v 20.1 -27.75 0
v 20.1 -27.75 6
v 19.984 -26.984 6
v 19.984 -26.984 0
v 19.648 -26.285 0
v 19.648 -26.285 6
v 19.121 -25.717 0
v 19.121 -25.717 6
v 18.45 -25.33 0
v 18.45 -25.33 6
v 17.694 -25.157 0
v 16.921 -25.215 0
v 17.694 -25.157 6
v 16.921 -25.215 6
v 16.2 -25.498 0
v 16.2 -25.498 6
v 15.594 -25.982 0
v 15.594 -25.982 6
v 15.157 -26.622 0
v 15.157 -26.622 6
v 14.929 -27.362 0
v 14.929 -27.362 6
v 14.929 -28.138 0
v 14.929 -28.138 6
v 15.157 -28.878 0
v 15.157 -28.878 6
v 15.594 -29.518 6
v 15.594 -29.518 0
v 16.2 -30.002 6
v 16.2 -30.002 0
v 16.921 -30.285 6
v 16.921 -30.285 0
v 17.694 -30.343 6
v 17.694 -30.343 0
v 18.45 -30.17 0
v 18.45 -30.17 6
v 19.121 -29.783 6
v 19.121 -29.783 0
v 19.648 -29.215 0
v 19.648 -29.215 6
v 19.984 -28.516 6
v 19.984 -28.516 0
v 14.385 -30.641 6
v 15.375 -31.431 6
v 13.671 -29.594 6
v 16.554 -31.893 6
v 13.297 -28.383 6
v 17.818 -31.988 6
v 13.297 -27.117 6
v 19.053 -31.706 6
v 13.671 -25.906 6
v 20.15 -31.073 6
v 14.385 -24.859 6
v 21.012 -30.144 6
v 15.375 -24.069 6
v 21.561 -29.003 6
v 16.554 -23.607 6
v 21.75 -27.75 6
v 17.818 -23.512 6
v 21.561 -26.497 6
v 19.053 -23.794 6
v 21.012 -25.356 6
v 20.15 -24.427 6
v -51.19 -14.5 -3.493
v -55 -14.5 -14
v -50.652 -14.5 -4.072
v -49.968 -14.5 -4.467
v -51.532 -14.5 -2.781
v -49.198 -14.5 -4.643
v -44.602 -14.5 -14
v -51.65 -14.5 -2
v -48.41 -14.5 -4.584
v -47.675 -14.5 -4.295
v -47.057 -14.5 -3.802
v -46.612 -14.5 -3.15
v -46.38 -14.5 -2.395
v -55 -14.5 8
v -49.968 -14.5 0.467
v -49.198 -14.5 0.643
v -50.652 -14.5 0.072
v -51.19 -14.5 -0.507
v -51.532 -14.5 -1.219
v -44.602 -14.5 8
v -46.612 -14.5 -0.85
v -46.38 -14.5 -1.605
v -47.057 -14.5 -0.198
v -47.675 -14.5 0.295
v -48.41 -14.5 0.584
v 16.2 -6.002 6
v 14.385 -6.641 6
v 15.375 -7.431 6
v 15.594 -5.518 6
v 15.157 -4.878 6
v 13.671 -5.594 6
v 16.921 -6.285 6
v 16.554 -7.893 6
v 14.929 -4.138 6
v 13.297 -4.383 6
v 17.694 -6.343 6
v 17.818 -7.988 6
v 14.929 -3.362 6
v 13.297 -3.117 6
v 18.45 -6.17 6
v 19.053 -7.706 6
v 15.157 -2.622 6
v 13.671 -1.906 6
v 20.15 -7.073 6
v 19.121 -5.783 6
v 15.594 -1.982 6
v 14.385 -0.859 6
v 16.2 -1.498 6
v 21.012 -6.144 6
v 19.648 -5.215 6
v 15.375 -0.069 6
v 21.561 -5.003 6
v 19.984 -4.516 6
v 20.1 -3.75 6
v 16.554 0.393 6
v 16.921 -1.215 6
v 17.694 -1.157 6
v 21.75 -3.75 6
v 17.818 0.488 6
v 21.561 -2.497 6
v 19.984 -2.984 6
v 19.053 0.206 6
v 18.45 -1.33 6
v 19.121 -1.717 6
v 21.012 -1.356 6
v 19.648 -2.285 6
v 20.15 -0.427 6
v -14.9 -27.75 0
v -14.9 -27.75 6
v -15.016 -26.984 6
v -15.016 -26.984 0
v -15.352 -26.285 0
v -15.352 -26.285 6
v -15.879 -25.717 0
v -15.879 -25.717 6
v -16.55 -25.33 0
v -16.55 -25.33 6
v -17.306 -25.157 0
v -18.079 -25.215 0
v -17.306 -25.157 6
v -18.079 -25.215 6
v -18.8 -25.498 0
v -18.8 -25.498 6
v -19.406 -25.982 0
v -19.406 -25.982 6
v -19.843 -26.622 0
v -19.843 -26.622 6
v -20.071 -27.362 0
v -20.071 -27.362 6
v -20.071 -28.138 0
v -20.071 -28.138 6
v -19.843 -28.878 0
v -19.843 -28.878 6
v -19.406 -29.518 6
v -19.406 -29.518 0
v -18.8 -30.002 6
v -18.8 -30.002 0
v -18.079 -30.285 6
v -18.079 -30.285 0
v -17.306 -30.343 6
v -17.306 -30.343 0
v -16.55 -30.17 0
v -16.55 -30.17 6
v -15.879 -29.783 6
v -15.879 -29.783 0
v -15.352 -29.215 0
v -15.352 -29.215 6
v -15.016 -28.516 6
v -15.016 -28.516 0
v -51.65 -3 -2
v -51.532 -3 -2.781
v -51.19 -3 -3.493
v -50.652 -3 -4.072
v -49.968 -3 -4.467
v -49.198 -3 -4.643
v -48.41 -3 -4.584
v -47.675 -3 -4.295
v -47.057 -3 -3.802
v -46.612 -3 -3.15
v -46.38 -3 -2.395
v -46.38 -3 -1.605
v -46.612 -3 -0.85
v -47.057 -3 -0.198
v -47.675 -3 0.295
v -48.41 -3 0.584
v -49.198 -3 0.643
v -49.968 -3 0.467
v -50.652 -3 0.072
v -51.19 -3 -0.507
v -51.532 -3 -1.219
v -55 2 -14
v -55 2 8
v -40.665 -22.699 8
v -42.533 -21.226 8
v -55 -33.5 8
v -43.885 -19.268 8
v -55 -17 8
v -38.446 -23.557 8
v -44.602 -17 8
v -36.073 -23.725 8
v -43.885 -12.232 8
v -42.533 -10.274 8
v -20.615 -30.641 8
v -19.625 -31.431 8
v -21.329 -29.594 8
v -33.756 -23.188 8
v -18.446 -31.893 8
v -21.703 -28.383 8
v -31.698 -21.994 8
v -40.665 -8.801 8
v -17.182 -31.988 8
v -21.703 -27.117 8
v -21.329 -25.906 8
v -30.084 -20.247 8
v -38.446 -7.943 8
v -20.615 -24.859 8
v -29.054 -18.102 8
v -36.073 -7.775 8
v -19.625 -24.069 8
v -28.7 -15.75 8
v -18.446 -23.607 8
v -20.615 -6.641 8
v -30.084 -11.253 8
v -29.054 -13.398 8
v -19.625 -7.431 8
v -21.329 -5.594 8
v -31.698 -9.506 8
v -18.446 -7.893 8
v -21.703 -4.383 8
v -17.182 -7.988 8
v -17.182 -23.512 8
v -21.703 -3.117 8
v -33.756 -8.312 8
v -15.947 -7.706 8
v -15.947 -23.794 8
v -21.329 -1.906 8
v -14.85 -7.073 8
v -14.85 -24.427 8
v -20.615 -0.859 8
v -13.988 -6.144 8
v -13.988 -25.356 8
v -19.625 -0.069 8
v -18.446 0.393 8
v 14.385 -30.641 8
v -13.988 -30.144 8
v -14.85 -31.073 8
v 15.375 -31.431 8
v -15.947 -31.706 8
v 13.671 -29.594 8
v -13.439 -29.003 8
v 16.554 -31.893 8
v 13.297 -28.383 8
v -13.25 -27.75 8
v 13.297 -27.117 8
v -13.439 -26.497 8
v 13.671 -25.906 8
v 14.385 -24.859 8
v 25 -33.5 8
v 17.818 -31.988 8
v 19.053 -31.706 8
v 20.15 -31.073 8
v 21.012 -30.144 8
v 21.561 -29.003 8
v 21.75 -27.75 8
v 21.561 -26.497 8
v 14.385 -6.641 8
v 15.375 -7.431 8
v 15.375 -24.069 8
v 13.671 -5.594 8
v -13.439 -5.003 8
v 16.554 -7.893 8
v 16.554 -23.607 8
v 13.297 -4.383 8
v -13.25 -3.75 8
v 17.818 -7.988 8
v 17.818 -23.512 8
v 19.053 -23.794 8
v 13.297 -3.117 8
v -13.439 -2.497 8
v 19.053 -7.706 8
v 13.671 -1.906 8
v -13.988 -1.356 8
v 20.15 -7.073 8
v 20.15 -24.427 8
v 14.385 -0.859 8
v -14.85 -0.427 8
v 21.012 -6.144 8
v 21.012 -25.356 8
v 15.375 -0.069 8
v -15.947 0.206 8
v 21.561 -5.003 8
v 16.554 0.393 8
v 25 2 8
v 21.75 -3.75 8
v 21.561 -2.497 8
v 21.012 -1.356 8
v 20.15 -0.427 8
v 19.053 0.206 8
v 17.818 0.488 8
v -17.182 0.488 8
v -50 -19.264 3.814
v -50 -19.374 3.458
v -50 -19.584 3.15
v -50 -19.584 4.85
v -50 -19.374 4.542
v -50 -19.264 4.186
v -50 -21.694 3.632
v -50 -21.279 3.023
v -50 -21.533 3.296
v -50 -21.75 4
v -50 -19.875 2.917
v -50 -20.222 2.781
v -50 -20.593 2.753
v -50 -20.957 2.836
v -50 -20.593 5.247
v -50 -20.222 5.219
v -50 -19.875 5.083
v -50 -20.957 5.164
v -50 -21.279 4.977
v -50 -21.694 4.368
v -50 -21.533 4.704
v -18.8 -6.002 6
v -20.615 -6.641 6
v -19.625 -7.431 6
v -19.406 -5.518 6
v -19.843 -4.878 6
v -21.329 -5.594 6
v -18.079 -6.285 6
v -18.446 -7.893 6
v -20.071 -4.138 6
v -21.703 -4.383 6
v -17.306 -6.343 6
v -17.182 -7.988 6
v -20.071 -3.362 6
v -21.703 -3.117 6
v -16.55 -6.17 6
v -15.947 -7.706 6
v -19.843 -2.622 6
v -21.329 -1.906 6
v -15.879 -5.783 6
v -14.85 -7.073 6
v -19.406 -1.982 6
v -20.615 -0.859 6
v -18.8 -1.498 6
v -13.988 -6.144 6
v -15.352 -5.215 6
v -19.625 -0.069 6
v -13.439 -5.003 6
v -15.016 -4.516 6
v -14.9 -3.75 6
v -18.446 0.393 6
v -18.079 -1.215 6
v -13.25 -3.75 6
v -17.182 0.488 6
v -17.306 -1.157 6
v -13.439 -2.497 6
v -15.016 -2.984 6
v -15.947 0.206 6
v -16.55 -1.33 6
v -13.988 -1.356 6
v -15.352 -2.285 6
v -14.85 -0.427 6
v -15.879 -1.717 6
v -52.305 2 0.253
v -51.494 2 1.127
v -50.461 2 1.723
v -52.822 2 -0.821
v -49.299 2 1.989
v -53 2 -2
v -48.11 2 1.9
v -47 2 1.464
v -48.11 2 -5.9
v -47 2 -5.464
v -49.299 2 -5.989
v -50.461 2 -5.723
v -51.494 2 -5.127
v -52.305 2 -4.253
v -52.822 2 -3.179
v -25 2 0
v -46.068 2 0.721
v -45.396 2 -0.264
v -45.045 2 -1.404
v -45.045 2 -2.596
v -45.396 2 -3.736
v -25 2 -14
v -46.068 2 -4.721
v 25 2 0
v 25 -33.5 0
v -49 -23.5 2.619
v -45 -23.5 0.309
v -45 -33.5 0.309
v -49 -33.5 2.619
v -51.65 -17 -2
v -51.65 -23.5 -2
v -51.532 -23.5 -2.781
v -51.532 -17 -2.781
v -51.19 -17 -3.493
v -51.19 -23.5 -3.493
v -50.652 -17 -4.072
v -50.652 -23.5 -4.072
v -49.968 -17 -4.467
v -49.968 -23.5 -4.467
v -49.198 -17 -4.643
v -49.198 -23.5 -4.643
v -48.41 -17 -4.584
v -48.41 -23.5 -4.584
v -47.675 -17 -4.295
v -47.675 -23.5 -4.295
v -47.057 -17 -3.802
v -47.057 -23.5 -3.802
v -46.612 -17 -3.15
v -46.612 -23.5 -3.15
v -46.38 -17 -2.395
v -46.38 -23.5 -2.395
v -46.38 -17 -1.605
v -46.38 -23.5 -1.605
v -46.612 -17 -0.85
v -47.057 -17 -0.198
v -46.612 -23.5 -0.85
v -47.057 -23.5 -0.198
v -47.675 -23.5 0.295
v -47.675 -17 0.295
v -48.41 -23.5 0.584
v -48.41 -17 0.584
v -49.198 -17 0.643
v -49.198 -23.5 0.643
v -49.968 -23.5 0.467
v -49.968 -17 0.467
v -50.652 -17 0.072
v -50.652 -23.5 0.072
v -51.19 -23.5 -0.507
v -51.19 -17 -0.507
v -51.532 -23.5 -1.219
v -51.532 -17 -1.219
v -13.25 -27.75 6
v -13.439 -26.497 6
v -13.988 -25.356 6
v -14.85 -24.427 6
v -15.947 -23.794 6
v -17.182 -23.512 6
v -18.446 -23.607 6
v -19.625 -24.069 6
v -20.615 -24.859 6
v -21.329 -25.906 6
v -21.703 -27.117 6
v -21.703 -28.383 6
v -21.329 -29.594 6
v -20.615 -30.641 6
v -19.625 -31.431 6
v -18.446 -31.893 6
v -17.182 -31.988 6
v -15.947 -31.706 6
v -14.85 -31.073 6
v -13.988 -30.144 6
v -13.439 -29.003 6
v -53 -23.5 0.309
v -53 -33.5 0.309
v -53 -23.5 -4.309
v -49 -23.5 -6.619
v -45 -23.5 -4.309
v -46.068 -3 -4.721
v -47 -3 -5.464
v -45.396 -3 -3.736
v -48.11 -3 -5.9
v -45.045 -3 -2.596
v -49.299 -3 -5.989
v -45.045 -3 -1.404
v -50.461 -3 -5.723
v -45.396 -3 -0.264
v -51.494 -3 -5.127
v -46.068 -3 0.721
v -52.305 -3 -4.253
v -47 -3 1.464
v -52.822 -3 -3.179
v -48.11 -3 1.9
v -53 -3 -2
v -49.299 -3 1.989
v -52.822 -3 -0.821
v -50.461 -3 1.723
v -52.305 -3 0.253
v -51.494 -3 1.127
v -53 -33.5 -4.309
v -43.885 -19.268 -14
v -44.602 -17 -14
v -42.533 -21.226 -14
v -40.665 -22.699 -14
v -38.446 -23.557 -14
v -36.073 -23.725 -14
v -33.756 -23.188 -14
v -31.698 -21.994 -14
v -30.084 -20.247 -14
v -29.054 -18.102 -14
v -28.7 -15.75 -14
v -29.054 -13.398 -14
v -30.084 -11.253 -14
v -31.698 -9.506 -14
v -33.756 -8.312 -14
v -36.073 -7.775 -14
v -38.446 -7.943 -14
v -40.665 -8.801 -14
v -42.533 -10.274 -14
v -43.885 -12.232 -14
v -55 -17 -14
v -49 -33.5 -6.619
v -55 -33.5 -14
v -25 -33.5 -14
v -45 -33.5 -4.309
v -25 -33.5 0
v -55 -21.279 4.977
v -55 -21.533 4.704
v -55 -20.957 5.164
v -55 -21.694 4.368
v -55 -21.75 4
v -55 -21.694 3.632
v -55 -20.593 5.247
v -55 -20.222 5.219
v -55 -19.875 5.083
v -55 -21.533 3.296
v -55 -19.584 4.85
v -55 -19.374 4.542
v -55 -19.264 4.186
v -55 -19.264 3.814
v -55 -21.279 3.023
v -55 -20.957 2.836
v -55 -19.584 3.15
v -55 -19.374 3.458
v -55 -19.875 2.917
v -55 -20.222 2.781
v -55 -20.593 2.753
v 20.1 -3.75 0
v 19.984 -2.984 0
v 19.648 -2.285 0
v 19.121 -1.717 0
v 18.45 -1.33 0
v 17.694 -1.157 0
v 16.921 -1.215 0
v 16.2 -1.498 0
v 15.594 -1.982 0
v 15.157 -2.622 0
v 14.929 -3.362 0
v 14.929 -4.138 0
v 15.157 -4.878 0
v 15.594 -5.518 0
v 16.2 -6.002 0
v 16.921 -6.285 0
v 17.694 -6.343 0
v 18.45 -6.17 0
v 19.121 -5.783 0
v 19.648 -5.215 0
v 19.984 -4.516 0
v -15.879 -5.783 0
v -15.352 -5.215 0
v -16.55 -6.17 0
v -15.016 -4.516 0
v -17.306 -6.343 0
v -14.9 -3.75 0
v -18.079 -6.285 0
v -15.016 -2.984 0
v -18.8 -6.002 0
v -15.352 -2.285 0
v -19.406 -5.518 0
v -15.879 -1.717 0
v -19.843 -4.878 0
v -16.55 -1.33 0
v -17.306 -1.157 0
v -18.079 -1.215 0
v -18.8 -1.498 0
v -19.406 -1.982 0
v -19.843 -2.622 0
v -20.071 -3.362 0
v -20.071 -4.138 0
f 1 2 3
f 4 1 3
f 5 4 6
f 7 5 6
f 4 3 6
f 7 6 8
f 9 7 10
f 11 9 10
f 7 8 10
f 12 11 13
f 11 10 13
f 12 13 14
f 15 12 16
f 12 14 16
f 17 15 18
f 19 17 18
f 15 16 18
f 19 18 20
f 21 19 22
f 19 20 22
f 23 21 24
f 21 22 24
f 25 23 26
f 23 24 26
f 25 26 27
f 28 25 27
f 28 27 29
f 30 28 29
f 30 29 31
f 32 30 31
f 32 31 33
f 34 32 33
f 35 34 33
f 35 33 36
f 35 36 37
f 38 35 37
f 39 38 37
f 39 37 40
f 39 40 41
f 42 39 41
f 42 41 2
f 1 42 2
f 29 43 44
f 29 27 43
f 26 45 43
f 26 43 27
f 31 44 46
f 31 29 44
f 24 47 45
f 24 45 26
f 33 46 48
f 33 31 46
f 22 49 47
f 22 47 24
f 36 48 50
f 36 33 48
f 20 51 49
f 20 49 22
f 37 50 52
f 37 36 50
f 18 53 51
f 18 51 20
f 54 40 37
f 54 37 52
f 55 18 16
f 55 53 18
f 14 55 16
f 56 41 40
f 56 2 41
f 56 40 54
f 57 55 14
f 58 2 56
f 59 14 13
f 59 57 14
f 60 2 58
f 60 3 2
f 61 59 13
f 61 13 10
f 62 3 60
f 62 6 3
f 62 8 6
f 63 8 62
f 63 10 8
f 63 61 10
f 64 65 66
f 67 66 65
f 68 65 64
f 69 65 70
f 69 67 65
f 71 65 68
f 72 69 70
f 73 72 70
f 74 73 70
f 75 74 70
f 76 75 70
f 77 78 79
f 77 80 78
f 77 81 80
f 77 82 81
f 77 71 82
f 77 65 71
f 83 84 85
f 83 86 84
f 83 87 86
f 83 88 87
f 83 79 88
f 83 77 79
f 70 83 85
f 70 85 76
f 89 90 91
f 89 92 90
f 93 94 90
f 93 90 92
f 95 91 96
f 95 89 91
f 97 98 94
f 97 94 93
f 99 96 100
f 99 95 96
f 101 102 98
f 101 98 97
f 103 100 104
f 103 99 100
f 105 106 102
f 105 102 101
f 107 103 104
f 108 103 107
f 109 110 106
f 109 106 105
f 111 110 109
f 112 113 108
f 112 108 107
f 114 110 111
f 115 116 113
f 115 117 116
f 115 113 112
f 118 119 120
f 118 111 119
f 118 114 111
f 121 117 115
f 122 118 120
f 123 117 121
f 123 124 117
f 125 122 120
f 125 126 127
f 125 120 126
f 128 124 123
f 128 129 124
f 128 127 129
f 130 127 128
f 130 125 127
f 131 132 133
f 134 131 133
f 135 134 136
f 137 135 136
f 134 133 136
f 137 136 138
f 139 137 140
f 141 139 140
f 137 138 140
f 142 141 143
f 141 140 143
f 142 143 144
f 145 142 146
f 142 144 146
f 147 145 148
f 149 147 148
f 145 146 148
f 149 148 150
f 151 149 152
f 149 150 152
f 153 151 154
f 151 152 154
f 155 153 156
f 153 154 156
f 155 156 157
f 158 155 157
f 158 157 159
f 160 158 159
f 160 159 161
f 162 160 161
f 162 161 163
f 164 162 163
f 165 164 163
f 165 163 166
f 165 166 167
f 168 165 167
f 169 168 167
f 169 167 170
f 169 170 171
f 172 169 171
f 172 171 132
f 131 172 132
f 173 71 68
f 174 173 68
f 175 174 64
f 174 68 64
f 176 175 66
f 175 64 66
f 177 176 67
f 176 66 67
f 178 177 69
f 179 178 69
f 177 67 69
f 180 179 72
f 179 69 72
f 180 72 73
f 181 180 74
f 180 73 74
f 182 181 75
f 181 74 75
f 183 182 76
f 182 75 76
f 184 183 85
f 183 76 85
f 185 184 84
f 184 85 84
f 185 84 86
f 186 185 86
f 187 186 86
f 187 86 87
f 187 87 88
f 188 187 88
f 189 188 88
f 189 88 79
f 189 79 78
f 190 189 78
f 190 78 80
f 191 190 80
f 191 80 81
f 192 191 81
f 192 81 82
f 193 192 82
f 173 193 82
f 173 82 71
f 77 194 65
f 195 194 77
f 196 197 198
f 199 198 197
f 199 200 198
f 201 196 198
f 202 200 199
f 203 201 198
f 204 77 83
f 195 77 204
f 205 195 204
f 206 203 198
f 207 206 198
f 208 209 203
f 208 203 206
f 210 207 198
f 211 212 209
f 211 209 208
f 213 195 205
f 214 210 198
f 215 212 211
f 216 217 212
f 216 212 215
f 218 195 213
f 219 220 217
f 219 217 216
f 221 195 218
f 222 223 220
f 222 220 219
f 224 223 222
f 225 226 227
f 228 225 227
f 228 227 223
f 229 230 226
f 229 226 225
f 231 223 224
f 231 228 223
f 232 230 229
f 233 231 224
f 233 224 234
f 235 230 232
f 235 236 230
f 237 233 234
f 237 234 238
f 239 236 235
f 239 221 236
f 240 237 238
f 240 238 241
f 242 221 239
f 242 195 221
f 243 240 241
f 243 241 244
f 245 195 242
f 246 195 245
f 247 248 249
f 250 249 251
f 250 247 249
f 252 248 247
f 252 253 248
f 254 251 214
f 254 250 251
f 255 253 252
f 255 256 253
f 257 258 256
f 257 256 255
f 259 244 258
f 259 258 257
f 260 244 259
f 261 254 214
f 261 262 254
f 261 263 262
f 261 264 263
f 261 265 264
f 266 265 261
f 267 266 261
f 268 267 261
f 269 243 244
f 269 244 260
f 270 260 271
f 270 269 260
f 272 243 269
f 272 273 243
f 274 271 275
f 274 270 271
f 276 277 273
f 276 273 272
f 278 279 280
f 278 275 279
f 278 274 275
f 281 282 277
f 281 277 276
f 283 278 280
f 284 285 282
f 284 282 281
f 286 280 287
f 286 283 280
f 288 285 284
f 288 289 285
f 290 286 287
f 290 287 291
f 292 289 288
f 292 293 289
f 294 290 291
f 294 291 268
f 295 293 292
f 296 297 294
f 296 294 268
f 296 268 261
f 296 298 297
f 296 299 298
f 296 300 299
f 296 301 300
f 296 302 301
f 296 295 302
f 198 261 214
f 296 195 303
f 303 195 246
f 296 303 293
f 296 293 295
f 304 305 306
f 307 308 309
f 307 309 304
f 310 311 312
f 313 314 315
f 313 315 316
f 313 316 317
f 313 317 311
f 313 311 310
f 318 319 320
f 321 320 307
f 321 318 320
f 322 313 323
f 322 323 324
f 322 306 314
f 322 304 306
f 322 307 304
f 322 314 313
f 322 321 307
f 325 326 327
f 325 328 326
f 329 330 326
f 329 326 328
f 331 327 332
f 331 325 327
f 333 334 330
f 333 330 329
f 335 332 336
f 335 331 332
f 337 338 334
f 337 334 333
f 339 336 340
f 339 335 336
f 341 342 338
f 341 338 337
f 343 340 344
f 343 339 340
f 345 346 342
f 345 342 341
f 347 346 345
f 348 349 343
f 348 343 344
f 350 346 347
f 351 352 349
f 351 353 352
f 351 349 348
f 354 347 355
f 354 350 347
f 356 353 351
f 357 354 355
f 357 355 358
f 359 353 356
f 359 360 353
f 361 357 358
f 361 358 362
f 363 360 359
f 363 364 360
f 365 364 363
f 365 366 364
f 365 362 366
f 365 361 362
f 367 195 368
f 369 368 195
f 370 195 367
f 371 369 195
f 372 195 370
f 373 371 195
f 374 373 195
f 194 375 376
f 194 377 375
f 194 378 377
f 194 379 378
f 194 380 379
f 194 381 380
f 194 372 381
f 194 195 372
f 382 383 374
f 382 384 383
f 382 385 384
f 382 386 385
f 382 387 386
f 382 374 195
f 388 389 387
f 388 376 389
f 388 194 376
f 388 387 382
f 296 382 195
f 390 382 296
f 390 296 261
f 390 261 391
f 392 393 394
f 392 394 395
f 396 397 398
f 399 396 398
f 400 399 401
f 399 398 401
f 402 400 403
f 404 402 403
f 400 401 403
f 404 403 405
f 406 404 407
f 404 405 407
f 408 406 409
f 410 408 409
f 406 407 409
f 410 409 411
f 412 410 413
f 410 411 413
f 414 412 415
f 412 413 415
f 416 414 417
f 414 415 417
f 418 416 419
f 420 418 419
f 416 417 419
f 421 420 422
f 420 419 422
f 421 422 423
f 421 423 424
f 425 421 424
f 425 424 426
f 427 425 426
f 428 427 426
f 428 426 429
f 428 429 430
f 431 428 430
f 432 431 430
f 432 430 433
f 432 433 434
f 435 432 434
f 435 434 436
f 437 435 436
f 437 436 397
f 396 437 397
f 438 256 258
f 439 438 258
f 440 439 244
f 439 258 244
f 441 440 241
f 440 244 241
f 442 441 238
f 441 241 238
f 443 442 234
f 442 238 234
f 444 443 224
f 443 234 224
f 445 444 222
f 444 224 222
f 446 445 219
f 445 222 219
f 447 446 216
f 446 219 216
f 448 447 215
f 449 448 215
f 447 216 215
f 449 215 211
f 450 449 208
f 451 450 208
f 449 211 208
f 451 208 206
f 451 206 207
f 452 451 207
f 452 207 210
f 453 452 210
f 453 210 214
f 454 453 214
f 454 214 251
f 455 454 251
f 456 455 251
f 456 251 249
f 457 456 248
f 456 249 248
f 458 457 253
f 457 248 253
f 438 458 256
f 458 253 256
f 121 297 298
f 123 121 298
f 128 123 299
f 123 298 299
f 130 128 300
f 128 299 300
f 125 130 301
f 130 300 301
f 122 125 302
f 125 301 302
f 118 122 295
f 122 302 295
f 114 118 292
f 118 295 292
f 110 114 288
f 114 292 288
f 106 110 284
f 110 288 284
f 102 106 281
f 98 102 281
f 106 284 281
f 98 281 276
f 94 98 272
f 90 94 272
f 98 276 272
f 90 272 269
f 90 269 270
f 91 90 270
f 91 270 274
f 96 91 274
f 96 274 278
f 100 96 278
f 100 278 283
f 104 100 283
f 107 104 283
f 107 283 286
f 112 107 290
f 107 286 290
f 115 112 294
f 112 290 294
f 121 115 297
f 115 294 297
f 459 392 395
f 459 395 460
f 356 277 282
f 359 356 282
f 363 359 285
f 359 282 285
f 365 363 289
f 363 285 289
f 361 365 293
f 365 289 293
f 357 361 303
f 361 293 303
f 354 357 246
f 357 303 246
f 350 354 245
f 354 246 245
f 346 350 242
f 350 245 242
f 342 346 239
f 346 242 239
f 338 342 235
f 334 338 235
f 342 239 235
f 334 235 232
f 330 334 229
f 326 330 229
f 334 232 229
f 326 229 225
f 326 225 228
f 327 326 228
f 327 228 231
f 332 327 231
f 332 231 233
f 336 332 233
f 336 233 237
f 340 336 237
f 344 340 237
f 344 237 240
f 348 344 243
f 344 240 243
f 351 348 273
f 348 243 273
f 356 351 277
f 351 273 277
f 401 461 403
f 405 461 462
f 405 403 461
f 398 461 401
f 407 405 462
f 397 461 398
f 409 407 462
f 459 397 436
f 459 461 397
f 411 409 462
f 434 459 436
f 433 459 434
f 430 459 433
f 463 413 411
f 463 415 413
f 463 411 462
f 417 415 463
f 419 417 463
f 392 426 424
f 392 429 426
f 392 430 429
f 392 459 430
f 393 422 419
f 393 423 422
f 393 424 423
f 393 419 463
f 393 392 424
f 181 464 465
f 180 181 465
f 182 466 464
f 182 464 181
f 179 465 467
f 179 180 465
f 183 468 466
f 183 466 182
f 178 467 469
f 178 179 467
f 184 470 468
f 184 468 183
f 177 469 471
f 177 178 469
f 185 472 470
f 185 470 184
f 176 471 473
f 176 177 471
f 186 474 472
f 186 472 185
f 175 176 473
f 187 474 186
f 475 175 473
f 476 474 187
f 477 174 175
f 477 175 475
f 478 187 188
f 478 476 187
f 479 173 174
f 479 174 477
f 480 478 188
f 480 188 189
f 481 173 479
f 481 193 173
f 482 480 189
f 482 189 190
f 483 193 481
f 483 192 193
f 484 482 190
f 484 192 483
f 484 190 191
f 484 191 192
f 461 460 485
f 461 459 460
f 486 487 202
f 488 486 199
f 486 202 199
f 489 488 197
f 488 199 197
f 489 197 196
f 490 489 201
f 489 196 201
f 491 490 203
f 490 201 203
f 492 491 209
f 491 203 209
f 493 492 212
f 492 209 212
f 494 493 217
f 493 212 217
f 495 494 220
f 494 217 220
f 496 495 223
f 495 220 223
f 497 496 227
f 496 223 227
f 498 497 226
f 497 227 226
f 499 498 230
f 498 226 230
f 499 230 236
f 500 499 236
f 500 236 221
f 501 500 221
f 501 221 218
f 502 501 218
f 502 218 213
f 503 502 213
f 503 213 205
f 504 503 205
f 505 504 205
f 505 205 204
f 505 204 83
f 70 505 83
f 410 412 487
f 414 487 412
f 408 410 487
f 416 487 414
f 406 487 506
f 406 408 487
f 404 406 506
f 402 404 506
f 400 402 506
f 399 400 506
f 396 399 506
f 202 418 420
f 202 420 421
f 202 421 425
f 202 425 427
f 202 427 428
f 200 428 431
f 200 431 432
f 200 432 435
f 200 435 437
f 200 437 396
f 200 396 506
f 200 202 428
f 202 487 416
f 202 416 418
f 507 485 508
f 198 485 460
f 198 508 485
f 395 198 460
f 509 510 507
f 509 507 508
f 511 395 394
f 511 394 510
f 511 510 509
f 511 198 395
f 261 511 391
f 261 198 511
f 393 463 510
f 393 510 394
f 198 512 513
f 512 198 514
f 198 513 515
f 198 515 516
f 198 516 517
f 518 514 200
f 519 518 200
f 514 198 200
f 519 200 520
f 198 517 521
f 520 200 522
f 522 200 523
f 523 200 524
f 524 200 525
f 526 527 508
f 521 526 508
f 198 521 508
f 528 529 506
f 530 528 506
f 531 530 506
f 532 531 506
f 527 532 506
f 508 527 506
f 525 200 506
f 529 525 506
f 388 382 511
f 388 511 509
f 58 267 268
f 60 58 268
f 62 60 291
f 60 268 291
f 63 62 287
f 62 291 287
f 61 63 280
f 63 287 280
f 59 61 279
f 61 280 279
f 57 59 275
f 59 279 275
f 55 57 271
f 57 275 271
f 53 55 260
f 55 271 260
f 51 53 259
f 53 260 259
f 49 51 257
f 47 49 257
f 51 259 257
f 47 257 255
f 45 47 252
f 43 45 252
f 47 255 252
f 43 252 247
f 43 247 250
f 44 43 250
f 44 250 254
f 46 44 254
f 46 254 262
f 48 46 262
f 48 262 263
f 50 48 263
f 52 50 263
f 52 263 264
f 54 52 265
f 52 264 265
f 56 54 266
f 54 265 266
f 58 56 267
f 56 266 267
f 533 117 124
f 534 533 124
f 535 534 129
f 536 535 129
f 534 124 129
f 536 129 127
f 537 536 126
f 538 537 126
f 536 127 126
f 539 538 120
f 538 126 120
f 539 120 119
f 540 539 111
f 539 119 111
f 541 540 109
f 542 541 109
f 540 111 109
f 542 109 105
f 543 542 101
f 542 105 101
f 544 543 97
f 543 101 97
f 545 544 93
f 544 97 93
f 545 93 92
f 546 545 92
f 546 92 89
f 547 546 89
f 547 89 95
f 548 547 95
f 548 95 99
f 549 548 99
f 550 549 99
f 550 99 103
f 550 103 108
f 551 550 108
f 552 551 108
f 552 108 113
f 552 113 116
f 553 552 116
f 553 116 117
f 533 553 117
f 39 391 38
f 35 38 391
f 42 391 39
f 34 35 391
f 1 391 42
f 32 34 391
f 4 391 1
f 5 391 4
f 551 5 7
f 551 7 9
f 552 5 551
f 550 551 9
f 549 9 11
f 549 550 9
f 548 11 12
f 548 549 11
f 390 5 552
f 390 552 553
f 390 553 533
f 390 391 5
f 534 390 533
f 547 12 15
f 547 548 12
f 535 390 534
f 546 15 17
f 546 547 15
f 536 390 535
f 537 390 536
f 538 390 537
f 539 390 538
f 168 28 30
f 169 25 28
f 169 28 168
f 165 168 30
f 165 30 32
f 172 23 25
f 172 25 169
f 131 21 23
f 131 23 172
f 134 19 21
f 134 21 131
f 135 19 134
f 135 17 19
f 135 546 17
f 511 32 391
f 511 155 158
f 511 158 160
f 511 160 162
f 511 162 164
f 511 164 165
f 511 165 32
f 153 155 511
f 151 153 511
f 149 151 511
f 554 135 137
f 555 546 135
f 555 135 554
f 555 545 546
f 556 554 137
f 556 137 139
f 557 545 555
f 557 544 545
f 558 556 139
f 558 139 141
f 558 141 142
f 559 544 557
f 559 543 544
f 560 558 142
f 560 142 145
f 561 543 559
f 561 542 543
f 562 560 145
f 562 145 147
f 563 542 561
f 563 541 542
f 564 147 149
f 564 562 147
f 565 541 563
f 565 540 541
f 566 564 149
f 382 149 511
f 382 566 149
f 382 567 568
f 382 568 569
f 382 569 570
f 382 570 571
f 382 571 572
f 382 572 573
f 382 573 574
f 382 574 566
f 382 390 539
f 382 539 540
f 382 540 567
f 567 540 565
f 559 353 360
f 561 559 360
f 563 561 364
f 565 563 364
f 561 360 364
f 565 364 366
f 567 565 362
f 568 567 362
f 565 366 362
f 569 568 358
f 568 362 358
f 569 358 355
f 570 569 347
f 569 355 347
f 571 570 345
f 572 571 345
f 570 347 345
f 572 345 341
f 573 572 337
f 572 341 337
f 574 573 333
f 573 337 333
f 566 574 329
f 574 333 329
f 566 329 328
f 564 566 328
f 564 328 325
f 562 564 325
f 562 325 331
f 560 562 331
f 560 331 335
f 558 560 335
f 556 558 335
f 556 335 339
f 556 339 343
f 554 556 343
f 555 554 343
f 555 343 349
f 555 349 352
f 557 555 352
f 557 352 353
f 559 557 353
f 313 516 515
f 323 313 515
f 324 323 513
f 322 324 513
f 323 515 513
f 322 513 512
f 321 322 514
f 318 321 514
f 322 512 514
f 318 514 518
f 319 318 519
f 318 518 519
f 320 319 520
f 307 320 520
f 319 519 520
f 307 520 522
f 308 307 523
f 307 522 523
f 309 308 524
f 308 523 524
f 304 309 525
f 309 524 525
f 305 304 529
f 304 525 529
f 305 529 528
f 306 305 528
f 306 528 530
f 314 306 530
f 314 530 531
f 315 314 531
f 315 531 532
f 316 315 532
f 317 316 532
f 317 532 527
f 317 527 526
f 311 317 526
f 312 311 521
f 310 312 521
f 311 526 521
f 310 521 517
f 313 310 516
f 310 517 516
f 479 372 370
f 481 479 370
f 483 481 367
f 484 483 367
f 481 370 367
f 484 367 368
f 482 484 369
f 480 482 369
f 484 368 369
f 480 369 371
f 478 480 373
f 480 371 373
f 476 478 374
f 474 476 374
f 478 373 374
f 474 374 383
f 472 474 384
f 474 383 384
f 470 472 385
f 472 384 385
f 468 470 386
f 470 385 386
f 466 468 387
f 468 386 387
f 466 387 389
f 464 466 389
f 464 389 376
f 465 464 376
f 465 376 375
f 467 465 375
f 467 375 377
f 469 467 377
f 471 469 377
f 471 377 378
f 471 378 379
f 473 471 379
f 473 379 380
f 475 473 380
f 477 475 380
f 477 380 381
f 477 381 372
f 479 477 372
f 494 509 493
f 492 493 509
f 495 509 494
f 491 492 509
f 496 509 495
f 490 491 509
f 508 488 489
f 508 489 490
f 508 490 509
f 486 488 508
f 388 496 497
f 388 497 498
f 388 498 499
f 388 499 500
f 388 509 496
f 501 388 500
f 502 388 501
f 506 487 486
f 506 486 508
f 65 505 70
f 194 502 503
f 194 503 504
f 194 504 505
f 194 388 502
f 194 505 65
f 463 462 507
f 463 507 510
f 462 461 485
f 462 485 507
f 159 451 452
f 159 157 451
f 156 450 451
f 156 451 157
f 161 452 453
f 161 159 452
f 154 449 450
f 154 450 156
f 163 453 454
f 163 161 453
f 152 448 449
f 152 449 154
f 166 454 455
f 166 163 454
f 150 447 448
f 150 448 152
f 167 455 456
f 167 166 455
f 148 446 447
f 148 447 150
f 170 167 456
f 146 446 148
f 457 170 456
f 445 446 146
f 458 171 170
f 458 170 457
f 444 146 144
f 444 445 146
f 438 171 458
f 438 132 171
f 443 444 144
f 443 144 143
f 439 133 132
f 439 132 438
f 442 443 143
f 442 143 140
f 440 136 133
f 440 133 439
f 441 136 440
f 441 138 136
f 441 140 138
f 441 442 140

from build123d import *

# Parameters (mm, degrees)
ESQUISSE1_W              = 50
ESQUISSE1_H              = 31.5
ESQUISSE1_R              = 2.1
BOSS_EXTRU_1_DEPTH       = 8
ESQUISSE3_W              = 44
ESQUISSE3_H              = 31.5
BOSS_EXTRU_2_DEPTH       = 30
ESQUISSE4_R              = 8
ENL_V_MAT_EXTRU_1_DEPTH  = 60
ENL_V_MAT_EXTRU_2_DEPTH  = 56
ESQUISSE7_R              = 3.6
ENL_V_MAT_EXTRU_3_DEPTH  = 2
D_GAGEMENT_M51_D         = 5.3
D_GAGEMENT_M51_DEPTH     = 34
D_GAGEMENT_M51_TIP       = 1.59228064
ENL_V_MAT_EXTRU_4_DEPTH  = 8
ESQUISSE13_W             = 30
ESQUISSE13_H             = 22
ENL_V_MAT_EXTRU_6_DEPTH  = 58
ESQUISSE14_R             = 4
ENL_V_MAT_EXTRU_7_DEPTH  = 3
ESQUISSE15_R             = 1.25
ENL_V_MAT_EXTRU_8_DEPTH  = 5
BOSS_EXTRU_3_DEPTH       = 2
BOSS_EXTRU_4_START       = 2
ESQUISSE17_R             = 4
BOSS_EXTRU_4_DEPTH       = 2
ESQUISSE18_R             = 2.6
ENL_V_MAT_EXTRU_9_DEPTH  = 22
ESQUISSE19_R             = 4.25
ENL_V_MAT_EXTRU_10_DEPTH = 2


with BuildPart() as part:
    # Esquisse1 → Boss.-Extru.1 (new body)
    with BuildSketch(Plane.XY):
        with Locations((0, -15.75)):
            Rectangle(ESQUISSE1_W, ESQUISSE1_H)
        with Locations((17.5, -27.75)):
            Circle(ESQUISSE1_R, mode=Mode.SUBTRACT)
        with Locations((17.5, -3.75)):
            Circle(ESQUISSE1_R, mode=Mode.SUBTRACT)
        with Locations((-17.5, -3.75)):
            Circle(ESQUISSE1_R, mode=Mode.SUBTRACT)
        with Locations((-17.5, -27.75)):
            Circle(ESQUISSE1_R, mode=Mode.SUBTRACT)
    extrude(amount=BOSS_EXTRU_1_DEPTH)

    # Esquisse3 → Boss.-Extru.2 (add)
    with BuildSketch(Plane.ZY.offset(25)):
        with Locations((-14, -15.75)):
            Rectangle(ESQUISSE3_W, ESQUISSE3_H)
    extrude(amount=BOSS_EXTRU_2_DEPTH)

    # Esquisse4 → Enlèv. mat.-Extru.1 (cut)
    with BuildSketch(Plane.XY.offset(8)):
        with Locations((-36.7, -15.75)):
            Circle(ESQUISSE4_R)
    extrude(amount=-ENL_V_MAT_EXTRU_1_DEPTH, mode=Mode.SUBTRACT)

    # Esquisse6 → Enlèv. mat.-Extru.2 (cut)
    with BuildSketch(Plane.XY.offset(8)):
        with BuildLine():
            Line((-55, -14.5), (-44.601740315, -14.5))
            ThreePointArc((-44.601740315, -14.5), (-44.7, -15.75), (-44.601740315, -17))
            Line((-44.601740315, -17), (-55, -17))
            Line((-55, -17), (-55, -14.5))
        make_face()
    extrude(amount=-ENL_V_MAT_EXTRU_2_DEPTH, mode=Mode.SUBTRACT)

    # Esquisse7 → Enlèv. mat.-Extru.3 (cut)
    with BuildSketch(Plane.XY.offset(8)):
        with Locations((-17.5, -3.75)):
            Circle(ESQUISSE7_R)
        with Locations((-17.5, -27.75)):
            Circle(ESQUISSE7_R)
        with Locations((17.5, -27.75)):
            Circle(ESQUISSE7_R)
        with Locations((17.5, -3.75)):
            Circle(ESQUISSE7_R)
    extrude(amount=-ENL_V_MAT_EXTRU_3_DEPTH, mode=Mode.SUBTRACT)

    # Dégagement M51
    with Locations(Plane(origin=(0, 0, 0), x_dir=(1, 0, 0), z_dir=(0, 1, 0))):
        with Locations((-49, 2)):
            Hole(D_GAGEMENT_M51_D / 2, depth=D_GAGEMENT_M51_DEPTH)
            with Locations((0, 0, -(D_GAGEMENT_M51_DEPTH + D_GAGEMENT_M51_TIP / 2))):  # 118° drill point
                Cone(0, D_GAGEMENT_M51_D / 2, D_GAGEMENT_M51_TIP, mode=Mode.SUBTRACT)

    # Esquisse12 → Enlèv. mat.-Extru.4 (cut)
    with BuildSketch(Plane.XZ.offset(31.5)):
        Polygon((-45, 0.309401077), (-49, 2.618802154), (-53, 0.309401077), (-53, -4.309401077), (-49, -6.618802154), (-45, -4.309401077), align=None)
    extrude(amount=-ENL_V_MAT_EXTRU_4_DEPTH, mode=Mode.SUBTRACT)

    # Esquisse13 → Enlèv. mat.-Extru.6 (cut)
    with BuildSketch(Plane.XZ.offset(31.5)):
        with Locations((-40, -25)):
            Rectangle(ESQUISSE13_W, ESQUISSE13_H)
    extrude(amount=-ENL_V_MAT_EXTRU_6_DEPTH, mode=Mode.SUBTRACT)

    # Esquisse14 → Enlèv. mat.-Extru.7 (cut)
    with BuildSketch(Plane(origin=(0, 0, 0), x_dir=(1, 0, 0), z_dir=(0, 1, 0))):
        with Locations(Location((-49, 2, 0), (0, 0, 180))):
            Circle(ESQUISSE14_R)
    extrude(amount=-ENL_V_MAT_EXTRU_7_DEPTH, mode=Mode.SUBTRACT)

    # Esquisse15 → Enlèv. mat.-Extru.8 (cut)
    with BuildSketch(Plane.ZY.offset(55)):
        with Locations(Location((4, -20.5, 0), (0, 0, 270))):
            Circle(ESQUISSE15_R)
    extrude(amount=-ENL_V_MAT_EXTRU_8_DEPTH, mode=Mode.SUBTRACT)

    # Esquisse16 → Boss.-Extru.3 (add)
    with BuildSketch(Plane.XZ.offset(31.5)):
        Polygon((-55, 8), (-55, -14), (-25, -14), (-25, 0), (25, 0), (25, 8), align=None)
        Polygon((-53, 0.309401077), (-53, -4.309401077), (-49, -6.618802154), (-45, -4.309401077), (-45, 0.309401077), (-49, 2.618802154), align=None, mode=Mode.SUBTRACT)
    extrude(amount=BOSS_EXTRU_3_DEPTH)

    # Esquisse17 → Boss.-Extru.4 (add)
    with BuildSketch(Plane(origin=(0, 0, 0), x_dir=(1, 0, 0), z_dir=(0, 1, 0)).offset(BOSS_EXTRU_4_START)):
        Polygon((-25, 0), (-25, 14), (-55, 14), (-55, -8), (25, -8), (25, 0), align=None)
        with Locations(Location((-49, 2, 0), (0, 0, 180))):
            Circle(ESQUISSE17_R, mode=Mode.SUBTRACT)
    extrude(amount=-BOSS_EXTRU_4_DEPTH)

    # Esquisse18 → Enlèv. mat.-Extru.9 (cut)
    with BuildSketch(Plane.XY.offset(8)):
        with Locations((-17.5, -3.75)):
            Circle(ESQUISSE18_R)
        with Locations((17.5, -3.75)):
            Circle(ESQUISSE18_R)
        with Locations((17.5, -27.75)):
            Circle(ESQUISSE18_R)
        with Locations((-17.5, -27.75)):
            Circle(ESQUISSE18_R)
    extrude(amount=-ENL_V_MAT_EXTRU_9_DEPTH, mode=Mode.SUBTRACT)

    # Esquisse19 → Enlèv. mat.-Extru.10 (cut)
    with BuildSketch(Plane.XY.offset(8)):
        with Locations((-17.5, -3.75)):
            Circle(ESQUISSE19_R)
        with Locations((17.5, -3.75)):
            Circle(ESQUISSE19_R)
        with Locations((17.5, -27.75)):
            Circle(ESQUISSE19_R)
        with Locations((-17.5, -27.75)):
            Circle(ESQUISSE19_R)
    extrude(amount=-ENL_V_MAT_EXTRU_10_DEPTH, mode=Mode.SUBTRACT)


solid = part.part
